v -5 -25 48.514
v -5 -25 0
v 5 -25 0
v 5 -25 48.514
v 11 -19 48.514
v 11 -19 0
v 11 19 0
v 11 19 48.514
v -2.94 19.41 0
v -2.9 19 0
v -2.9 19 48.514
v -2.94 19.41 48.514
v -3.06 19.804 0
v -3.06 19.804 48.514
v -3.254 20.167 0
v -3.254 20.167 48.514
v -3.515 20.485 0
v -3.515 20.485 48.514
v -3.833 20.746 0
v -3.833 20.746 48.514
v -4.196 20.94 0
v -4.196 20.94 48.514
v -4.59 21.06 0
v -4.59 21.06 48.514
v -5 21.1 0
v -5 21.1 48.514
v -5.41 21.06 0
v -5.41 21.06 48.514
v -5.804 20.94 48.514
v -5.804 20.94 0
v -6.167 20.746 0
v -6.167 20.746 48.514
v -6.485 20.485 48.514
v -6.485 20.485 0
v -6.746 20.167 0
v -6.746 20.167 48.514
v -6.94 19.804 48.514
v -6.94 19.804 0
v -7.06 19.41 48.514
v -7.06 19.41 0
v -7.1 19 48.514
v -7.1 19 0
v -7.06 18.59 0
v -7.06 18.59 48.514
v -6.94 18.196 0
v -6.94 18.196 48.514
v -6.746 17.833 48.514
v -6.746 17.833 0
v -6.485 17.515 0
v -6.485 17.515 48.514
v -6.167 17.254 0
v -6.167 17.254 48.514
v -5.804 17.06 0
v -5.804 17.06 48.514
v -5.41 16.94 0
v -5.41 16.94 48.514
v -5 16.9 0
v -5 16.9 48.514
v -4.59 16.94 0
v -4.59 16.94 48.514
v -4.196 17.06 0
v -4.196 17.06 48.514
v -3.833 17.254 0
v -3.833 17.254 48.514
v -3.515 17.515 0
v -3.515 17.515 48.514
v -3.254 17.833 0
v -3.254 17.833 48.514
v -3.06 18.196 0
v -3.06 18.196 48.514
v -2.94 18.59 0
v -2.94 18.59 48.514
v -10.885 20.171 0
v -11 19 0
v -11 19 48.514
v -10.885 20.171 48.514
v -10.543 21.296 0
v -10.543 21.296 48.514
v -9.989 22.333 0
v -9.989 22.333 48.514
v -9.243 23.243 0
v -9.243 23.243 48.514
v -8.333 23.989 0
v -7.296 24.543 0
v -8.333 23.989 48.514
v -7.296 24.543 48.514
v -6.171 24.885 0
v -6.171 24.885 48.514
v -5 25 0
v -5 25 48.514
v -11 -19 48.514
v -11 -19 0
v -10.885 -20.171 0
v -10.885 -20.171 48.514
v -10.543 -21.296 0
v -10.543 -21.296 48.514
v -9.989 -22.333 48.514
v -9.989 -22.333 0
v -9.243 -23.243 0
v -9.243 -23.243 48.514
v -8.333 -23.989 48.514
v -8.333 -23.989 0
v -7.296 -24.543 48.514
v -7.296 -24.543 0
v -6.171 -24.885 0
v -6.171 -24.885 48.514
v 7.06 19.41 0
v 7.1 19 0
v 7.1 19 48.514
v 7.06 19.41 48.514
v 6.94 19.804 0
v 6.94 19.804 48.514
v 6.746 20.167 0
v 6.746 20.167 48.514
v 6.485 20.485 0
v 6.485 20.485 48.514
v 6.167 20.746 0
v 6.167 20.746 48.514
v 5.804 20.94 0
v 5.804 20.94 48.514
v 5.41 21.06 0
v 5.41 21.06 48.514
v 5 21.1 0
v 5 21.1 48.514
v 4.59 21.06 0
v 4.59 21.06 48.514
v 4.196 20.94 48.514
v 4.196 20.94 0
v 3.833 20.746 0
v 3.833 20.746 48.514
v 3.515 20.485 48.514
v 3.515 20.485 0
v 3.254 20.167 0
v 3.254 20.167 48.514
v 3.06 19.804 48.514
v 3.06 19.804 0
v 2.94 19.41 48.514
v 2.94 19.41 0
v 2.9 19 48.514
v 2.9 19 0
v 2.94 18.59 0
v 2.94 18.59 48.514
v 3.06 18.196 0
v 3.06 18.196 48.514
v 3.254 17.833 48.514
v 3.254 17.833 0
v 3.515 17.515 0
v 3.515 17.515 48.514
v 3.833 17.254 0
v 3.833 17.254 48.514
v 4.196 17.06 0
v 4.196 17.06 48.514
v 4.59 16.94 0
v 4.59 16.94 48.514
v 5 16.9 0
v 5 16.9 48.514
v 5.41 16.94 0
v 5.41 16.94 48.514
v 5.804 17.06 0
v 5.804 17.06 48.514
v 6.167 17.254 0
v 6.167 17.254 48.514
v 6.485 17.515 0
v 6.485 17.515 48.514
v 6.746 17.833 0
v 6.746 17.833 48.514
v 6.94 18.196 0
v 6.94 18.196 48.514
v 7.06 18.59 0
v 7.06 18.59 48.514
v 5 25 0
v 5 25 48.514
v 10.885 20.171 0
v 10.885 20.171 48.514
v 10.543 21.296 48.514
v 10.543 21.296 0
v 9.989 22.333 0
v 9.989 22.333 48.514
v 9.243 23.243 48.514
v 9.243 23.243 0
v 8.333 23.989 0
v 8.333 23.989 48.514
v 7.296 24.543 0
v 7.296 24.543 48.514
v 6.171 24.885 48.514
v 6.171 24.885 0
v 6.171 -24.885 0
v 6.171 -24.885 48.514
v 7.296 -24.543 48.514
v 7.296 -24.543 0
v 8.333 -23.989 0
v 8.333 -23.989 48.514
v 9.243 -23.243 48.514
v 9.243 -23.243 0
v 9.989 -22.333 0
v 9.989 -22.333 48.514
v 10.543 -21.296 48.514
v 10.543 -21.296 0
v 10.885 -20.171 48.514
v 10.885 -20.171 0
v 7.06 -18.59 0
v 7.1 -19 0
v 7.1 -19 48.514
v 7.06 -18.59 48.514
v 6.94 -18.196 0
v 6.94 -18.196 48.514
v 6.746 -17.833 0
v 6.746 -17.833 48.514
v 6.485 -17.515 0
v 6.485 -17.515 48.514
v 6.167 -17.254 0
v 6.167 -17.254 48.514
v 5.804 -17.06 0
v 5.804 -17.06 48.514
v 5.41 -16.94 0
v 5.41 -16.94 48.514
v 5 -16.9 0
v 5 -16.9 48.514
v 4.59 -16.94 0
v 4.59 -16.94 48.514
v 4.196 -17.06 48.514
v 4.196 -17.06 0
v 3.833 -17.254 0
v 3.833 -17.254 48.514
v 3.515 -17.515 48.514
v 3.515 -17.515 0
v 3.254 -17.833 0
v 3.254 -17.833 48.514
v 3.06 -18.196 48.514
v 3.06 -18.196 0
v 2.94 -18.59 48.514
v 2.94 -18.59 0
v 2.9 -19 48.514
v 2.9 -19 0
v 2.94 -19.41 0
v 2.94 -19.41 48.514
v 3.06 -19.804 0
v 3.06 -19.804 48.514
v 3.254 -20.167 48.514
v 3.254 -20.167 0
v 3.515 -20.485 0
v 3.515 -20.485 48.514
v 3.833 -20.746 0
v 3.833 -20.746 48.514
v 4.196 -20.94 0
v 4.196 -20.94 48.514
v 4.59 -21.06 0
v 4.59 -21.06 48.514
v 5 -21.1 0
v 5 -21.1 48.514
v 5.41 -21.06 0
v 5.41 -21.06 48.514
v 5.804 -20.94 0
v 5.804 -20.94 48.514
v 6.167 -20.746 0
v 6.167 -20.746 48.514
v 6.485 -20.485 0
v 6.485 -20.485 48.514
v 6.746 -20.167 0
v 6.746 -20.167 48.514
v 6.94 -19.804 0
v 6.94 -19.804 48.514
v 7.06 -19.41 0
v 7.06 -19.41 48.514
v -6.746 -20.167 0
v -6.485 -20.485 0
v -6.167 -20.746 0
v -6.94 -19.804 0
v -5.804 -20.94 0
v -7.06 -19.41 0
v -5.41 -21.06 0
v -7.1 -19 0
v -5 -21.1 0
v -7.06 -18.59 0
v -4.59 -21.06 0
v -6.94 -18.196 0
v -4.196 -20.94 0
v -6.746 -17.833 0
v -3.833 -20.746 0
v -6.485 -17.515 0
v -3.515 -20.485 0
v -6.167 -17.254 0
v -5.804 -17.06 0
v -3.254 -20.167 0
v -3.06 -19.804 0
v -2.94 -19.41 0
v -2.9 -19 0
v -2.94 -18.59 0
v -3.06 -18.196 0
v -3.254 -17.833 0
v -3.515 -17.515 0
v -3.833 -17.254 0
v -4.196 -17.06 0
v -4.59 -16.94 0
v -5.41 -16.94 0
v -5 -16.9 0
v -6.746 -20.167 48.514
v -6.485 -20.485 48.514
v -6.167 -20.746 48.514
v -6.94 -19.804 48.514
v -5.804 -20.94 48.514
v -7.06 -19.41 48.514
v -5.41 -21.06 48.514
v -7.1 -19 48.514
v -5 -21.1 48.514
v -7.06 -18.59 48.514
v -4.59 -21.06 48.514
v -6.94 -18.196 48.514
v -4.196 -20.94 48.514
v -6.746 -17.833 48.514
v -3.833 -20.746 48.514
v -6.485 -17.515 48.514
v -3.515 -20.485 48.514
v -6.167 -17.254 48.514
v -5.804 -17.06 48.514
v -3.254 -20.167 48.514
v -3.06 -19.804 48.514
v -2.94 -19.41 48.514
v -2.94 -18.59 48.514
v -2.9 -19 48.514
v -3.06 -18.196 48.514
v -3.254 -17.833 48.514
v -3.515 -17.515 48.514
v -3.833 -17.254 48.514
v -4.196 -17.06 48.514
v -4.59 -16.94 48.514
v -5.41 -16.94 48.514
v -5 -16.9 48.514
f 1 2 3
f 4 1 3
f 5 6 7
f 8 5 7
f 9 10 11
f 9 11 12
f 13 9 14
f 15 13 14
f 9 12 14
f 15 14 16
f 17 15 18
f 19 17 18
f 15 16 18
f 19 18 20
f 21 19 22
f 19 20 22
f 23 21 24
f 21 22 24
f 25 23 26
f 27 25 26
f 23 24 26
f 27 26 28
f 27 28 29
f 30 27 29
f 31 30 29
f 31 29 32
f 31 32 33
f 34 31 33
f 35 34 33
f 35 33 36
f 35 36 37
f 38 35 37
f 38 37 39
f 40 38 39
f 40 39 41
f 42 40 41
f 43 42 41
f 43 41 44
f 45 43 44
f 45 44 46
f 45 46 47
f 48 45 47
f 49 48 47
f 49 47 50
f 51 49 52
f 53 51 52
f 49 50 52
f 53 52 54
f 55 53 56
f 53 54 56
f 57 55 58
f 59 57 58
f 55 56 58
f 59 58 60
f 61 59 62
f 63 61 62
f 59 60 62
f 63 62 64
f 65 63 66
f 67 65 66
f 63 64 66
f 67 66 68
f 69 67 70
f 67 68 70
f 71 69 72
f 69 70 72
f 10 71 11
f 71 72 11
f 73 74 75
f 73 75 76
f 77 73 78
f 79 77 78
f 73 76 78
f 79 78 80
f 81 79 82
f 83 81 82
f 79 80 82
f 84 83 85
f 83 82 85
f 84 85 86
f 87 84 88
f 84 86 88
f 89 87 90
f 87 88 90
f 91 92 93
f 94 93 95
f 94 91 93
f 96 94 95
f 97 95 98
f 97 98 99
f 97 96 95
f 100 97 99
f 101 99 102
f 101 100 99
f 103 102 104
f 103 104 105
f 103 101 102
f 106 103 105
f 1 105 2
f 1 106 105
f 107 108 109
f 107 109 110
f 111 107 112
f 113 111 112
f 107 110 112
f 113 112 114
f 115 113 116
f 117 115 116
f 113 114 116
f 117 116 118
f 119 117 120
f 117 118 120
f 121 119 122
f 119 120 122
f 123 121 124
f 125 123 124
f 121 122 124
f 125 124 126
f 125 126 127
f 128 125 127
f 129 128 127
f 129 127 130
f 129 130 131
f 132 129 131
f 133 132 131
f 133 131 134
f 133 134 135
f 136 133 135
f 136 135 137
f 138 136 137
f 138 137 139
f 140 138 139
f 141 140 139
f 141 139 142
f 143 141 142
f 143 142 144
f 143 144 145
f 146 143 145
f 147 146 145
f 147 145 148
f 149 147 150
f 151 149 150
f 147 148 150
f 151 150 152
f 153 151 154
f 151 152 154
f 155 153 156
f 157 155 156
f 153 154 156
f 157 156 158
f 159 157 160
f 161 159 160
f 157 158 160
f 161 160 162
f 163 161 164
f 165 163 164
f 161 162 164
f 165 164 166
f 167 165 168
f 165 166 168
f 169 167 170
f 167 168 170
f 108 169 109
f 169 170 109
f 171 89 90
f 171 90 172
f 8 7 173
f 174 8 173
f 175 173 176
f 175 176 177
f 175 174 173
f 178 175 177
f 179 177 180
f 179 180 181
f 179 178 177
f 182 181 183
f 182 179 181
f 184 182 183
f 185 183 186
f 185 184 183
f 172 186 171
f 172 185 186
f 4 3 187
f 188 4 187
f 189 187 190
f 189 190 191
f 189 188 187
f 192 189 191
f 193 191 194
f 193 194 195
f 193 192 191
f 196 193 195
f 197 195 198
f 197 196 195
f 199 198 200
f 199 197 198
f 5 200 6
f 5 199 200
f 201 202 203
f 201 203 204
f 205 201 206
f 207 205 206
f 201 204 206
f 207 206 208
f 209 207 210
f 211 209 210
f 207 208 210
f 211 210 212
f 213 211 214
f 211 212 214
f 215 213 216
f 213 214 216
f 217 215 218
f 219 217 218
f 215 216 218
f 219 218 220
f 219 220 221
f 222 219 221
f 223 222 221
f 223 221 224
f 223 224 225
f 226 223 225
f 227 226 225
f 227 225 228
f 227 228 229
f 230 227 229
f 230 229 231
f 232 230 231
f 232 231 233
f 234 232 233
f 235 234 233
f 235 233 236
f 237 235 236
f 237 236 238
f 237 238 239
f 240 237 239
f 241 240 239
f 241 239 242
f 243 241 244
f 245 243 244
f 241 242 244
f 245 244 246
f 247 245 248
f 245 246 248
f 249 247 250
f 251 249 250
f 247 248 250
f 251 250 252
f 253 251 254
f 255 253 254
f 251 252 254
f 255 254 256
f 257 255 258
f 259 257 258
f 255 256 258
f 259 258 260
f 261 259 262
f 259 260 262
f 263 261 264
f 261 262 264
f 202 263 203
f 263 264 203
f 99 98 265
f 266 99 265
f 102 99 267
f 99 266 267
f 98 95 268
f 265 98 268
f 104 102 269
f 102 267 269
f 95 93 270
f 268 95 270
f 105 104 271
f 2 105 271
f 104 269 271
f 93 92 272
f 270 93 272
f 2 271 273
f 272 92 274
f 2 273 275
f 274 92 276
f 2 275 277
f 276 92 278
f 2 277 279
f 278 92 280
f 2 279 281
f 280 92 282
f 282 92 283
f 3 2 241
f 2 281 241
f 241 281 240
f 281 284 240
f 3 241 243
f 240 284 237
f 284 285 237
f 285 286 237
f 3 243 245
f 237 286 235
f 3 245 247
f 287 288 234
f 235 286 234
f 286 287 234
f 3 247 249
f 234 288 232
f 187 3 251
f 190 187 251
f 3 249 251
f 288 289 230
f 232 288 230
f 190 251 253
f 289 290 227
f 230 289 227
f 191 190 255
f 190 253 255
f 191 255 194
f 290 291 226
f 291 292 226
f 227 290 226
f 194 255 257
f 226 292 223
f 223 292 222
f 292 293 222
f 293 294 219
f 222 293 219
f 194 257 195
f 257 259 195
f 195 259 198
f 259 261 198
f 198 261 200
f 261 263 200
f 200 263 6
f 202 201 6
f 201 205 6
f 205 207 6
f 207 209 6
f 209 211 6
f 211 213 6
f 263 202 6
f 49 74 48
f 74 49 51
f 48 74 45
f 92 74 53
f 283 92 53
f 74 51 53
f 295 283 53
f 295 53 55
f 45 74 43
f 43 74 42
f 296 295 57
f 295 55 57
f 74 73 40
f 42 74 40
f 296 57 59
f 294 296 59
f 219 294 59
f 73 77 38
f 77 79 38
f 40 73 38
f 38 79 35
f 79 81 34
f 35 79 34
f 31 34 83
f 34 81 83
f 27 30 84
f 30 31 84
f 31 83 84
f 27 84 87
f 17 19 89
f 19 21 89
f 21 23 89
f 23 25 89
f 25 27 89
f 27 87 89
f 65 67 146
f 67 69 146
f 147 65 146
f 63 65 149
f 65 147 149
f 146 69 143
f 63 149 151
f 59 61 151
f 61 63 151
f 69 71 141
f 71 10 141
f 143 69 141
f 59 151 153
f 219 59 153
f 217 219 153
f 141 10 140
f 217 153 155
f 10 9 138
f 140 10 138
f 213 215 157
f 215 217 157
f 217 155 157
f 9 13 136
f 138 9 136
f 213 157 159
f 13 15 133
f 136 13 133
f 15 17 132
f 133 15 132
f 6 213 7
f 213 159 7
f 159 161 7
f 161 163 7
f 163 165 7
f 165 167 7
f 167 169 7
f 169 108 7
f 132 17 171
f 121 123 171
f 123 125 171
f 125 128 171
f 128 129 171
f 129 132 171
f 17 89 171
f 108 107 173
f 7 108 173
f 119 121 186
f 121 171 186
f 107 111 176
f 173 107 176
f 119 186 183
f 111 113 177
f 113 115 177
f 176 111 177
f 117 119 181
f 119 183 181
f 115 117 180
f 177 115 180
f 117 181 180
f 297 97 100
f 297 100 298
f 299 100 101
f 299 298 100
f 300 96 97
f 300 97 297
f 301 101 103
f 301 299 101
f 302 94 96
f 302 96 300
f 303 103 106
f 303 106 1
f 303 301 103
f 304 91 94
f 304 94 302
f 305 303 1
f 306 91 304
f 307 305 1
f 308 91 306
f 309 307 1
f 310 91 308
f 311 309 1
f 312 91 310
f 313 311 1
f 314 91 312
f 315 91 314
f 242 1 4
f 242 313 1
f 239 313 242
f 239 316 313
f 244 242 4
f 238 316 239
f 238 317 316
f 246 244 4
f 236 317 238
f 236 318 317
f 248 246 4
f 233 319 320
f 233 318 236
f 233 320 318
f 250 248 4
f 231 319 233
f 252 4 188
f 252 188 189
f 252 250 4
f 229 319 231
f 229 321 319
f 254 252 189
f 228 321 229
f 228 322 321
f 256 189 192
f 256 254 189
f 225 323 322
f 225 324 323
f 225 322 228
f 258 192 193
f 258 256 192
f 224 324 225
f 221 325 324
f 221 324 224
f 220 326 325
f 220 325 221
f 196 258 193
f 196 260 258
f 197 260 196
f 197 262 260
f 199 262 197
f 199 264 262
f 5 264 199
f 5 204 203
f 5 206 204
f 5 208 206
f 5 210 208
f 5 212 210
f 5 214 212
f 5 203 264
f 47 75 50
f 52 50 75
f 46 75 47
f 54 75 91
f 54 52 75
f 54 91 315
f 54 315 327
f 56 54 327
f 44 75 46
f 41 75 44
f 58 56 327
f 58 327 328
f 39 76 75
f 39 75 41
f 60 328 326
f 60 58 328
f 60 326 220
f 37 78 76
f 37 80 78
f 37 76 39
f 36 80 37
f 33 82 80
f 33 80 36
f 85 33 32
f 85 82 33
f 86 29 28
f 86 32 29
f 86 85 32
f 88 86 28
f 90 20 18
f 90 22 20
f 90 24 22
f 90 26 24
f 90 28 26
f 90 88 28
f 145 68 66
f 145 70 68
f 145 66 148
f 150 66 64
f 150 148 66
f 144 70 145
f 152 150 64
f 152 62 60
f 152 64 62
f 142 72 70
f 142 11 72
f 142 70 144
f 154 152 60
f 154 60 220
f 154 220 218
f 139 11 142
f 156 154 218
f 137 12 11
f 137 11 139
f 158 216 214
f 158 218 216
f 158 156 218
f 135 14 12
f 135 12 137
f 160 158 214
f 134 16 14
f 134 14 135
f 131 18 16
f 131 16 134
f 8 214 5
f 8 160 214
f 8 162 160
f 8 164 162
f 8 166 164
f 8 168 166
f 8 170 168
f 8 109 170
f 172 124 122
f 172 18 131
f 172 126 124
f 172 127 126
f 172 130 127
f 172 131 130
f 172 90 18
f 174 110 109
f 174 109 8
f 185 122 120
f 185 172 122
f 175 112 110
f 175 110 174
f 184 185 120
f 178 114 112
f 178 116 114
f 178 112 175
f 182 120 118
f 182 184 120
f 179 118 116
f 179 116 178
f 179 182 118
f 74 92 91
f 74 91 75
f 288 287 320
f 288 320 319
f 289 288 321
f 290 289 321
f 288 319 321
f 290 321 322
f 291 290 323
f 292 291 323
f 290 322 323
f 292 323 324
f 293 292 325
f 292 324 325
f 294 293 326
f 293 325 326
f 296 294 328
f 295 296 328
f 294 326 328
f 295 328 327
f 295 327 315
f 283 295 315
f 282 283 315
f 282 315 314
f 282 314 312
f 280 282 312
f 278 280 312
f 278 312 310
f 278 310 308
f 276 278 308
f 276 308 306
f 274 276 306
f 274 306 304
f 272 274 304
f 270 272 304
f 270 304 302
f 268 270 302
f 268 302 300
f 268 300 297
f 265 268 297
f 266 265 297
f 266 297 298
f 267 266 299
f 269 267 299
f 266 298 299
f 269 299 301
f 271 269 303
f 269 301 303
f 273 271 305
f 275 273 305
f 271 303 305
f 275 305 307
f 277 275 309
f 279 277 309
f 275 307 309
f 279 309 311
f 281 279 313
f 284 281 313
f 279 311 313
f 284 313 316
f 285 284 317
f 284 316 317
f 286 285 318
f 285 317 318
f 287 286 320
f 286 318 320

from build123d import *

# Parameters (mm, degrees)
ESQUISSE1_W             = 22
ESQUISSE1_H             = 50
BOSS_EXTRU_1_DEPTH      = 48.514
CONG_1_R                = 6
ESQUISSE2_R             = 2.1
ENL_V_MAT_EXTRU_1_DEPTH = 56.674125013


with BuildPart() as part:
    # Esquisse1 → Boss.-Extru.1 (new body)
    with BuildSketch(Plane.XY):
        Rectangle(ESQUISSE1_W, ESQUISSE1_H)
    extrude(amount=BOSS_EXTRU_1_DEPTH)

    # Congé1
    cong_1_edges = [part.edges().sort_by_distance(p)[0] for p in [
        (-11, 25, 24.257),
        (11, 25, 24.257),
        (11, -25, 24.257),
        (-11, -25, 24.257),
    ]]
    fillet(cong_1_edges, radius=CONG_1_R)

    # Esquisse2 → Enlèv. mat.-Extru.1 (cut, through all)
    with BuildSketch(Plane.XY.offset(48.514)):
        with Locations((-5, 19)):
            Circle(ESQUISSE2_R)
        with Locations((5, 19)):
            Circle(ESQUISSE2_R)
        with Locations((-5, -19)):
            Circle(ESQUISSE2_R)
        with Locations((5, -19)):
            Circle(ESQUISSE2_R)
    extrude(amount=-ENL_V_MAT_EXTRU_1_DEPTH, mode=Mode.SUBTRACT)


solid = part.part
